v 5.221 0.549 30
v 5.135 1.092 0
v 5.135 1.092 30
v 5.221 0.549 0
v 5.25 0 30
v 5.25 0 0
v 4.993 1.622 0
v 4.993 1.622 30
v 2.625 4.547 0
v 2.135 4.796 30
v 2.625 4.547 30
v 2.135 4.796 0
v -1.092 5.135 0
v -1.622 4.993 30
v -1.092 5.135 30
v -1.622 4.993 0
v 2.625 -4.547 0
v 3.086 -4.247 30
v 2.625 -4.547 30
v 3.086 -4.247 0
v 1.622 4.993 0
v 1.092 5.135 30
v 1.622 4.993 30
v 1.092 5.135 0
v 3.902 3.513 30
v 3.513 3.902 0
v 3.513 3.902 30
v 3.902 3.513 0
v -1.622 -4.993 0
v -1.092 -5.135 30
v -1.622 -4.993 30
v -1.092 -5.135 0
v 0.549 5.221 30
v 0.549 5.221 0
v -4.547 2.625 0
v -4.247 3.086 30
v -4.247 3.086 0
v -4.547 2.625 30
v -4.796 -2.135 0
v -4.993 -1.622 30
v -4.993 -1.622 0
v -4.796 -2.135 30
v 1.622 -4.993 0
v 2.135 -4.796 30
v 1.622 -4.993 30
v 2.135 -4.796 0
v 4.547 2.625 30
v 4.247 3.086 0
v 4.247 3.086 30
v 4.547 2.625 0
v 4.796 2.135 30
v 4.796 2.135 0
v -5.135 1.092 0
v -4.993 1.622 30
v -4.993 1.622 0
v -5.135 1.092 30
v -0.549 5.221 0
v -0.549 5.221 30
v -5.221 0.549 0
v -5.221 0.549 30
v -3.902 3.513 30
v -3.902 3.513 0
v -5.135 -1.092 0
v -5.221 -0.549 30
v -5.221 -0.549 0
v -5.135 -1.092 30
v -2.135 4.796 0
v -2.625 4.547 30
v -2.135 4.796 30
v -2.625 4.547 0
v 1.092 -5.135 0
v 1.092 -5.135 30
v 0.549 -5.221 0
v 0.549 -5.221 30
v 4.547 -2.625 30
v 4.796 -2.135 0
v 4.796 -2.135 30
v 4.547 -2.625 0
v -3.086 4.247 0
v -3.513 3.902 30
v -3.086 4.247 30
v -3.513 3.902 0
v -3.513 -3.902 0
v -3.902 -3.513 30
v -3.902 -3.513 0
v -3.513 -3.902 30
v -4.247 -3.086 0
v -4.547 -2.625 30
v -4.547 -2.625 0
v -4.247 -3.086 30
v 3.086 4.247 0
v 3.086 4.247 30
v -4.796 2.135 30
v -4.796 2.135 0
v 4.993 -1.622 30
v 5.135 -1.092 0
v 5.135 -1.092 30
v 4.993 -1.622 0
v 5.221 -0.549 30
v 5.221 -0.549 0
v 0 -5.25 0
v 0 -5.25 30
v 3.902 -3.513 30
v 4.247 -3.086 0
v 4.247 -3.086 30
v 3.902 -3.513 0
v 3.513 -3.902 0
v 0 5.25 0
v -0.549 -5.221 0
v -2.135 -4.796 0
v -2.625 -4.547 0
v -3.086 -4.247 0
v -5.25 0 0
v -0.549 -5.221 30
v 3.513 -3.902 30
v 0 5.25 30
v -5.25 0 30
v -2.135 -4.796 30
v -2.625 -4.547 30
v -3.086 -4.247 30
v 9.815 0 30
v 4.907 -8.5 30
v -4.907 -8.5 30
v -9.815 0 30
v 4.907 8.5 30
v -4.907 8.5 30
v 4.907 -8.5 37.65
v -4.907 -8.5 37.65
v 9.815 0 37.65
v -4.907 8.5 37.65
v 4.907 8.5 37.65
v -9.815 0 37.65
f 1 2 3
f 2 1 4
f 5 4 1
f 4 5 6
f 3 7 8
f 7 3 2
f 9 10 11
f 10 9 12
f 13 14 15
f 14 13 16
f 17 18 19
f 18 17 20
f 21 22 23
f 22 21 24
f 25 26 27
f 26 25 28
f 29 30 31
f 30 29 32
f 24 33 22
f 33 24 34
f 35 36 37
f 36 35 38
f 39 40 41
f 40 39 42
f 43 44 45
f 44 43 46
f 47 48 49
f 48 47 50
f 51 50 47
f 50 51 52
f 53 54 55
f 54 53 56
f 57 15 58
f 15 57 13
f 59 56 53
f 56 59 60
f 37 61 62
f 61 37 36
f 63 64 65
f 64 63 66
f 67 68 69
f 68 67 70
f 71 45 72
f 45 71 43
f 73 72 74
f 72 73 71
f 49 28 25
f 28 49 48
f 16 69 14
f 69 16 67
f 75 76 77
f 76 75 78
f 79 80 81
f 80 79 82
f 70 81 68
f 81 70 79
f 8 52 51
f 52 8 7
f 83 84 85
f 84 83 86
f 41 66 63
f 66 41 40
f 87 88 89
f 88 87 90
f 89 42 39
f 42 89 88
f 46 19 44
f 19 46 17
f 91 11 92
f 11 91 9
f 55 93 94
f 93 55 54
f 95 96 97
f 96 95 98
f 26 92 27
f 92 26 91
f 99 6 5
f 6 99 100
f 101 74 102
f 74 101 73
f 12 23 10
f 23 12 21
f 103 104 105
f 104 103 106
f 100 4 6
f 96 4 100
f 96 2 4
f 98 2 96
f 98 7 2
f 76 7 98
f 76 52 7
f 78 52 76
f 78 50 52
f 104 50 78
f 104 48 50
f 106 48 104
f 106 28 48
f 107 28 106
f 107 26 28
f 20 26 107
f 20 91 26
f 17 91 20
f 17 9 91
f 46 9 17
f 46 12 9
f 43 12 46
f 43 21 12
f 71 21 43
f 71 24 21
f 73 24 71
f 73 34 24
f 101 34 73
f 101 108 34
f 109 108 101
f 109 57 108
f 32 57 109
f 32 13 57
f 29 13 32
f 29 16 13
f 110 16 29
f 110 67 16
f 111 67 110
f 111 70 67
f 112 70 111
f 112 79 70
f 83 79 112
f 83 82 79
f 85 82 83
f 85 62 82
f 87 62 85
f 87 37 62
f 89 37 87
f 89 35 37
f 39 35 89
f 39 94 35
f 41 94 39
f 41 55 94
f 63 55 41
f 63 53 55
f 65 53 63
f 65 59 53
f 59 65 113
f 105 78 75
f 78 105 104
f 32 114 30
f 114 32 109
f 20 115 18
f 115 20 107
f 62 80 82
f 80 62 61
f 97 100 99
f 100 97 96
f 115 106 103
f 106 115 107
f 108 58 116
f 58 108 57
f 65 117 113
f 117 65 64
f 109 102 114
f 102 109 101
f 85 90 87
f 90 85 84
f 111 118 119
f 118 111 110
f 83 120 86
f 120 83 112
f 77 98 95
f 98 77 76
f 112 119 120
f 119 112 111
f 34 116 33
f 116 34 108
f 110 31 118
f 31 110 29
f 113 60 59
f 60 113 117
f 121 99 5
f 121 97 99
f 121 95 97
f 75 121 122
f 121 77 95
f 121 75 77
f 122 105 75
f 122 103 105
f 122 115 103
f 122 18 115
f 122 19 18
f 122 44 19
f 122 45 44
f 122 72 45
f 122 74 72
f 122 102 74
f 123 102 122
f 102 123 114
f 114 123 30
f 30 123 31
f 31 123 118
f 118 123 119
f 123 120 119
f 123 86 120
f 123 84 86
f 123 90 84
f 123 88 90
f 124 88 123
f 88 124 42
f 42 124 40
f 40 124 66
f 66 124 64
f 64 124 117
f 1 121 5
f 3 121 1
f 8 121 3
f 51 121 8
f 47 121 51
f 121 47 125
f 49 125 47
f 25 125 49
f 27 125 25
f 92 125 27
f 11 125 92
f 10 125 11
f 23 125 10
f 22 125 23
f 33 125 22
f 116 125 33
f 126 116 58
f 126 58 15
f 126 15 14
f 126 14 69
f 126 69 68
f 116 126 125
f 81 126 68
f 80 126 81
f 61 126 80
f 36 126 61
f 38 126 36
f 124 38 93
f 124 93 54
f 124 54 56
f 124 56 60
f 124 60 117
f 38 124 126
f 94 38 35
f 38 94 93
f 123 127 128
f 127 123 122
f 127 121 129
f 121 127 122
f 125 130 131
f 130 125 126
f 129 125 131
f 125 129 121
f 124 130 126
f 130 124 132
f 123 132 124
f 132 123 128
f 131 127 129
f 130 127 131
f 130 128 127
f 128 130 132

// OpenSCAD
// Hex-head bolt.
$fn = 60;
eps = 0.02;
thread_d = 10.5;
flat = 17;
shaft_l = 30;
union() { cylinder(d=thread_d,h=shaft_l); translate([0,0,shaft_l]) cylinder(d=flat/cos(30),h=flat*0.45,$fn=6); }
